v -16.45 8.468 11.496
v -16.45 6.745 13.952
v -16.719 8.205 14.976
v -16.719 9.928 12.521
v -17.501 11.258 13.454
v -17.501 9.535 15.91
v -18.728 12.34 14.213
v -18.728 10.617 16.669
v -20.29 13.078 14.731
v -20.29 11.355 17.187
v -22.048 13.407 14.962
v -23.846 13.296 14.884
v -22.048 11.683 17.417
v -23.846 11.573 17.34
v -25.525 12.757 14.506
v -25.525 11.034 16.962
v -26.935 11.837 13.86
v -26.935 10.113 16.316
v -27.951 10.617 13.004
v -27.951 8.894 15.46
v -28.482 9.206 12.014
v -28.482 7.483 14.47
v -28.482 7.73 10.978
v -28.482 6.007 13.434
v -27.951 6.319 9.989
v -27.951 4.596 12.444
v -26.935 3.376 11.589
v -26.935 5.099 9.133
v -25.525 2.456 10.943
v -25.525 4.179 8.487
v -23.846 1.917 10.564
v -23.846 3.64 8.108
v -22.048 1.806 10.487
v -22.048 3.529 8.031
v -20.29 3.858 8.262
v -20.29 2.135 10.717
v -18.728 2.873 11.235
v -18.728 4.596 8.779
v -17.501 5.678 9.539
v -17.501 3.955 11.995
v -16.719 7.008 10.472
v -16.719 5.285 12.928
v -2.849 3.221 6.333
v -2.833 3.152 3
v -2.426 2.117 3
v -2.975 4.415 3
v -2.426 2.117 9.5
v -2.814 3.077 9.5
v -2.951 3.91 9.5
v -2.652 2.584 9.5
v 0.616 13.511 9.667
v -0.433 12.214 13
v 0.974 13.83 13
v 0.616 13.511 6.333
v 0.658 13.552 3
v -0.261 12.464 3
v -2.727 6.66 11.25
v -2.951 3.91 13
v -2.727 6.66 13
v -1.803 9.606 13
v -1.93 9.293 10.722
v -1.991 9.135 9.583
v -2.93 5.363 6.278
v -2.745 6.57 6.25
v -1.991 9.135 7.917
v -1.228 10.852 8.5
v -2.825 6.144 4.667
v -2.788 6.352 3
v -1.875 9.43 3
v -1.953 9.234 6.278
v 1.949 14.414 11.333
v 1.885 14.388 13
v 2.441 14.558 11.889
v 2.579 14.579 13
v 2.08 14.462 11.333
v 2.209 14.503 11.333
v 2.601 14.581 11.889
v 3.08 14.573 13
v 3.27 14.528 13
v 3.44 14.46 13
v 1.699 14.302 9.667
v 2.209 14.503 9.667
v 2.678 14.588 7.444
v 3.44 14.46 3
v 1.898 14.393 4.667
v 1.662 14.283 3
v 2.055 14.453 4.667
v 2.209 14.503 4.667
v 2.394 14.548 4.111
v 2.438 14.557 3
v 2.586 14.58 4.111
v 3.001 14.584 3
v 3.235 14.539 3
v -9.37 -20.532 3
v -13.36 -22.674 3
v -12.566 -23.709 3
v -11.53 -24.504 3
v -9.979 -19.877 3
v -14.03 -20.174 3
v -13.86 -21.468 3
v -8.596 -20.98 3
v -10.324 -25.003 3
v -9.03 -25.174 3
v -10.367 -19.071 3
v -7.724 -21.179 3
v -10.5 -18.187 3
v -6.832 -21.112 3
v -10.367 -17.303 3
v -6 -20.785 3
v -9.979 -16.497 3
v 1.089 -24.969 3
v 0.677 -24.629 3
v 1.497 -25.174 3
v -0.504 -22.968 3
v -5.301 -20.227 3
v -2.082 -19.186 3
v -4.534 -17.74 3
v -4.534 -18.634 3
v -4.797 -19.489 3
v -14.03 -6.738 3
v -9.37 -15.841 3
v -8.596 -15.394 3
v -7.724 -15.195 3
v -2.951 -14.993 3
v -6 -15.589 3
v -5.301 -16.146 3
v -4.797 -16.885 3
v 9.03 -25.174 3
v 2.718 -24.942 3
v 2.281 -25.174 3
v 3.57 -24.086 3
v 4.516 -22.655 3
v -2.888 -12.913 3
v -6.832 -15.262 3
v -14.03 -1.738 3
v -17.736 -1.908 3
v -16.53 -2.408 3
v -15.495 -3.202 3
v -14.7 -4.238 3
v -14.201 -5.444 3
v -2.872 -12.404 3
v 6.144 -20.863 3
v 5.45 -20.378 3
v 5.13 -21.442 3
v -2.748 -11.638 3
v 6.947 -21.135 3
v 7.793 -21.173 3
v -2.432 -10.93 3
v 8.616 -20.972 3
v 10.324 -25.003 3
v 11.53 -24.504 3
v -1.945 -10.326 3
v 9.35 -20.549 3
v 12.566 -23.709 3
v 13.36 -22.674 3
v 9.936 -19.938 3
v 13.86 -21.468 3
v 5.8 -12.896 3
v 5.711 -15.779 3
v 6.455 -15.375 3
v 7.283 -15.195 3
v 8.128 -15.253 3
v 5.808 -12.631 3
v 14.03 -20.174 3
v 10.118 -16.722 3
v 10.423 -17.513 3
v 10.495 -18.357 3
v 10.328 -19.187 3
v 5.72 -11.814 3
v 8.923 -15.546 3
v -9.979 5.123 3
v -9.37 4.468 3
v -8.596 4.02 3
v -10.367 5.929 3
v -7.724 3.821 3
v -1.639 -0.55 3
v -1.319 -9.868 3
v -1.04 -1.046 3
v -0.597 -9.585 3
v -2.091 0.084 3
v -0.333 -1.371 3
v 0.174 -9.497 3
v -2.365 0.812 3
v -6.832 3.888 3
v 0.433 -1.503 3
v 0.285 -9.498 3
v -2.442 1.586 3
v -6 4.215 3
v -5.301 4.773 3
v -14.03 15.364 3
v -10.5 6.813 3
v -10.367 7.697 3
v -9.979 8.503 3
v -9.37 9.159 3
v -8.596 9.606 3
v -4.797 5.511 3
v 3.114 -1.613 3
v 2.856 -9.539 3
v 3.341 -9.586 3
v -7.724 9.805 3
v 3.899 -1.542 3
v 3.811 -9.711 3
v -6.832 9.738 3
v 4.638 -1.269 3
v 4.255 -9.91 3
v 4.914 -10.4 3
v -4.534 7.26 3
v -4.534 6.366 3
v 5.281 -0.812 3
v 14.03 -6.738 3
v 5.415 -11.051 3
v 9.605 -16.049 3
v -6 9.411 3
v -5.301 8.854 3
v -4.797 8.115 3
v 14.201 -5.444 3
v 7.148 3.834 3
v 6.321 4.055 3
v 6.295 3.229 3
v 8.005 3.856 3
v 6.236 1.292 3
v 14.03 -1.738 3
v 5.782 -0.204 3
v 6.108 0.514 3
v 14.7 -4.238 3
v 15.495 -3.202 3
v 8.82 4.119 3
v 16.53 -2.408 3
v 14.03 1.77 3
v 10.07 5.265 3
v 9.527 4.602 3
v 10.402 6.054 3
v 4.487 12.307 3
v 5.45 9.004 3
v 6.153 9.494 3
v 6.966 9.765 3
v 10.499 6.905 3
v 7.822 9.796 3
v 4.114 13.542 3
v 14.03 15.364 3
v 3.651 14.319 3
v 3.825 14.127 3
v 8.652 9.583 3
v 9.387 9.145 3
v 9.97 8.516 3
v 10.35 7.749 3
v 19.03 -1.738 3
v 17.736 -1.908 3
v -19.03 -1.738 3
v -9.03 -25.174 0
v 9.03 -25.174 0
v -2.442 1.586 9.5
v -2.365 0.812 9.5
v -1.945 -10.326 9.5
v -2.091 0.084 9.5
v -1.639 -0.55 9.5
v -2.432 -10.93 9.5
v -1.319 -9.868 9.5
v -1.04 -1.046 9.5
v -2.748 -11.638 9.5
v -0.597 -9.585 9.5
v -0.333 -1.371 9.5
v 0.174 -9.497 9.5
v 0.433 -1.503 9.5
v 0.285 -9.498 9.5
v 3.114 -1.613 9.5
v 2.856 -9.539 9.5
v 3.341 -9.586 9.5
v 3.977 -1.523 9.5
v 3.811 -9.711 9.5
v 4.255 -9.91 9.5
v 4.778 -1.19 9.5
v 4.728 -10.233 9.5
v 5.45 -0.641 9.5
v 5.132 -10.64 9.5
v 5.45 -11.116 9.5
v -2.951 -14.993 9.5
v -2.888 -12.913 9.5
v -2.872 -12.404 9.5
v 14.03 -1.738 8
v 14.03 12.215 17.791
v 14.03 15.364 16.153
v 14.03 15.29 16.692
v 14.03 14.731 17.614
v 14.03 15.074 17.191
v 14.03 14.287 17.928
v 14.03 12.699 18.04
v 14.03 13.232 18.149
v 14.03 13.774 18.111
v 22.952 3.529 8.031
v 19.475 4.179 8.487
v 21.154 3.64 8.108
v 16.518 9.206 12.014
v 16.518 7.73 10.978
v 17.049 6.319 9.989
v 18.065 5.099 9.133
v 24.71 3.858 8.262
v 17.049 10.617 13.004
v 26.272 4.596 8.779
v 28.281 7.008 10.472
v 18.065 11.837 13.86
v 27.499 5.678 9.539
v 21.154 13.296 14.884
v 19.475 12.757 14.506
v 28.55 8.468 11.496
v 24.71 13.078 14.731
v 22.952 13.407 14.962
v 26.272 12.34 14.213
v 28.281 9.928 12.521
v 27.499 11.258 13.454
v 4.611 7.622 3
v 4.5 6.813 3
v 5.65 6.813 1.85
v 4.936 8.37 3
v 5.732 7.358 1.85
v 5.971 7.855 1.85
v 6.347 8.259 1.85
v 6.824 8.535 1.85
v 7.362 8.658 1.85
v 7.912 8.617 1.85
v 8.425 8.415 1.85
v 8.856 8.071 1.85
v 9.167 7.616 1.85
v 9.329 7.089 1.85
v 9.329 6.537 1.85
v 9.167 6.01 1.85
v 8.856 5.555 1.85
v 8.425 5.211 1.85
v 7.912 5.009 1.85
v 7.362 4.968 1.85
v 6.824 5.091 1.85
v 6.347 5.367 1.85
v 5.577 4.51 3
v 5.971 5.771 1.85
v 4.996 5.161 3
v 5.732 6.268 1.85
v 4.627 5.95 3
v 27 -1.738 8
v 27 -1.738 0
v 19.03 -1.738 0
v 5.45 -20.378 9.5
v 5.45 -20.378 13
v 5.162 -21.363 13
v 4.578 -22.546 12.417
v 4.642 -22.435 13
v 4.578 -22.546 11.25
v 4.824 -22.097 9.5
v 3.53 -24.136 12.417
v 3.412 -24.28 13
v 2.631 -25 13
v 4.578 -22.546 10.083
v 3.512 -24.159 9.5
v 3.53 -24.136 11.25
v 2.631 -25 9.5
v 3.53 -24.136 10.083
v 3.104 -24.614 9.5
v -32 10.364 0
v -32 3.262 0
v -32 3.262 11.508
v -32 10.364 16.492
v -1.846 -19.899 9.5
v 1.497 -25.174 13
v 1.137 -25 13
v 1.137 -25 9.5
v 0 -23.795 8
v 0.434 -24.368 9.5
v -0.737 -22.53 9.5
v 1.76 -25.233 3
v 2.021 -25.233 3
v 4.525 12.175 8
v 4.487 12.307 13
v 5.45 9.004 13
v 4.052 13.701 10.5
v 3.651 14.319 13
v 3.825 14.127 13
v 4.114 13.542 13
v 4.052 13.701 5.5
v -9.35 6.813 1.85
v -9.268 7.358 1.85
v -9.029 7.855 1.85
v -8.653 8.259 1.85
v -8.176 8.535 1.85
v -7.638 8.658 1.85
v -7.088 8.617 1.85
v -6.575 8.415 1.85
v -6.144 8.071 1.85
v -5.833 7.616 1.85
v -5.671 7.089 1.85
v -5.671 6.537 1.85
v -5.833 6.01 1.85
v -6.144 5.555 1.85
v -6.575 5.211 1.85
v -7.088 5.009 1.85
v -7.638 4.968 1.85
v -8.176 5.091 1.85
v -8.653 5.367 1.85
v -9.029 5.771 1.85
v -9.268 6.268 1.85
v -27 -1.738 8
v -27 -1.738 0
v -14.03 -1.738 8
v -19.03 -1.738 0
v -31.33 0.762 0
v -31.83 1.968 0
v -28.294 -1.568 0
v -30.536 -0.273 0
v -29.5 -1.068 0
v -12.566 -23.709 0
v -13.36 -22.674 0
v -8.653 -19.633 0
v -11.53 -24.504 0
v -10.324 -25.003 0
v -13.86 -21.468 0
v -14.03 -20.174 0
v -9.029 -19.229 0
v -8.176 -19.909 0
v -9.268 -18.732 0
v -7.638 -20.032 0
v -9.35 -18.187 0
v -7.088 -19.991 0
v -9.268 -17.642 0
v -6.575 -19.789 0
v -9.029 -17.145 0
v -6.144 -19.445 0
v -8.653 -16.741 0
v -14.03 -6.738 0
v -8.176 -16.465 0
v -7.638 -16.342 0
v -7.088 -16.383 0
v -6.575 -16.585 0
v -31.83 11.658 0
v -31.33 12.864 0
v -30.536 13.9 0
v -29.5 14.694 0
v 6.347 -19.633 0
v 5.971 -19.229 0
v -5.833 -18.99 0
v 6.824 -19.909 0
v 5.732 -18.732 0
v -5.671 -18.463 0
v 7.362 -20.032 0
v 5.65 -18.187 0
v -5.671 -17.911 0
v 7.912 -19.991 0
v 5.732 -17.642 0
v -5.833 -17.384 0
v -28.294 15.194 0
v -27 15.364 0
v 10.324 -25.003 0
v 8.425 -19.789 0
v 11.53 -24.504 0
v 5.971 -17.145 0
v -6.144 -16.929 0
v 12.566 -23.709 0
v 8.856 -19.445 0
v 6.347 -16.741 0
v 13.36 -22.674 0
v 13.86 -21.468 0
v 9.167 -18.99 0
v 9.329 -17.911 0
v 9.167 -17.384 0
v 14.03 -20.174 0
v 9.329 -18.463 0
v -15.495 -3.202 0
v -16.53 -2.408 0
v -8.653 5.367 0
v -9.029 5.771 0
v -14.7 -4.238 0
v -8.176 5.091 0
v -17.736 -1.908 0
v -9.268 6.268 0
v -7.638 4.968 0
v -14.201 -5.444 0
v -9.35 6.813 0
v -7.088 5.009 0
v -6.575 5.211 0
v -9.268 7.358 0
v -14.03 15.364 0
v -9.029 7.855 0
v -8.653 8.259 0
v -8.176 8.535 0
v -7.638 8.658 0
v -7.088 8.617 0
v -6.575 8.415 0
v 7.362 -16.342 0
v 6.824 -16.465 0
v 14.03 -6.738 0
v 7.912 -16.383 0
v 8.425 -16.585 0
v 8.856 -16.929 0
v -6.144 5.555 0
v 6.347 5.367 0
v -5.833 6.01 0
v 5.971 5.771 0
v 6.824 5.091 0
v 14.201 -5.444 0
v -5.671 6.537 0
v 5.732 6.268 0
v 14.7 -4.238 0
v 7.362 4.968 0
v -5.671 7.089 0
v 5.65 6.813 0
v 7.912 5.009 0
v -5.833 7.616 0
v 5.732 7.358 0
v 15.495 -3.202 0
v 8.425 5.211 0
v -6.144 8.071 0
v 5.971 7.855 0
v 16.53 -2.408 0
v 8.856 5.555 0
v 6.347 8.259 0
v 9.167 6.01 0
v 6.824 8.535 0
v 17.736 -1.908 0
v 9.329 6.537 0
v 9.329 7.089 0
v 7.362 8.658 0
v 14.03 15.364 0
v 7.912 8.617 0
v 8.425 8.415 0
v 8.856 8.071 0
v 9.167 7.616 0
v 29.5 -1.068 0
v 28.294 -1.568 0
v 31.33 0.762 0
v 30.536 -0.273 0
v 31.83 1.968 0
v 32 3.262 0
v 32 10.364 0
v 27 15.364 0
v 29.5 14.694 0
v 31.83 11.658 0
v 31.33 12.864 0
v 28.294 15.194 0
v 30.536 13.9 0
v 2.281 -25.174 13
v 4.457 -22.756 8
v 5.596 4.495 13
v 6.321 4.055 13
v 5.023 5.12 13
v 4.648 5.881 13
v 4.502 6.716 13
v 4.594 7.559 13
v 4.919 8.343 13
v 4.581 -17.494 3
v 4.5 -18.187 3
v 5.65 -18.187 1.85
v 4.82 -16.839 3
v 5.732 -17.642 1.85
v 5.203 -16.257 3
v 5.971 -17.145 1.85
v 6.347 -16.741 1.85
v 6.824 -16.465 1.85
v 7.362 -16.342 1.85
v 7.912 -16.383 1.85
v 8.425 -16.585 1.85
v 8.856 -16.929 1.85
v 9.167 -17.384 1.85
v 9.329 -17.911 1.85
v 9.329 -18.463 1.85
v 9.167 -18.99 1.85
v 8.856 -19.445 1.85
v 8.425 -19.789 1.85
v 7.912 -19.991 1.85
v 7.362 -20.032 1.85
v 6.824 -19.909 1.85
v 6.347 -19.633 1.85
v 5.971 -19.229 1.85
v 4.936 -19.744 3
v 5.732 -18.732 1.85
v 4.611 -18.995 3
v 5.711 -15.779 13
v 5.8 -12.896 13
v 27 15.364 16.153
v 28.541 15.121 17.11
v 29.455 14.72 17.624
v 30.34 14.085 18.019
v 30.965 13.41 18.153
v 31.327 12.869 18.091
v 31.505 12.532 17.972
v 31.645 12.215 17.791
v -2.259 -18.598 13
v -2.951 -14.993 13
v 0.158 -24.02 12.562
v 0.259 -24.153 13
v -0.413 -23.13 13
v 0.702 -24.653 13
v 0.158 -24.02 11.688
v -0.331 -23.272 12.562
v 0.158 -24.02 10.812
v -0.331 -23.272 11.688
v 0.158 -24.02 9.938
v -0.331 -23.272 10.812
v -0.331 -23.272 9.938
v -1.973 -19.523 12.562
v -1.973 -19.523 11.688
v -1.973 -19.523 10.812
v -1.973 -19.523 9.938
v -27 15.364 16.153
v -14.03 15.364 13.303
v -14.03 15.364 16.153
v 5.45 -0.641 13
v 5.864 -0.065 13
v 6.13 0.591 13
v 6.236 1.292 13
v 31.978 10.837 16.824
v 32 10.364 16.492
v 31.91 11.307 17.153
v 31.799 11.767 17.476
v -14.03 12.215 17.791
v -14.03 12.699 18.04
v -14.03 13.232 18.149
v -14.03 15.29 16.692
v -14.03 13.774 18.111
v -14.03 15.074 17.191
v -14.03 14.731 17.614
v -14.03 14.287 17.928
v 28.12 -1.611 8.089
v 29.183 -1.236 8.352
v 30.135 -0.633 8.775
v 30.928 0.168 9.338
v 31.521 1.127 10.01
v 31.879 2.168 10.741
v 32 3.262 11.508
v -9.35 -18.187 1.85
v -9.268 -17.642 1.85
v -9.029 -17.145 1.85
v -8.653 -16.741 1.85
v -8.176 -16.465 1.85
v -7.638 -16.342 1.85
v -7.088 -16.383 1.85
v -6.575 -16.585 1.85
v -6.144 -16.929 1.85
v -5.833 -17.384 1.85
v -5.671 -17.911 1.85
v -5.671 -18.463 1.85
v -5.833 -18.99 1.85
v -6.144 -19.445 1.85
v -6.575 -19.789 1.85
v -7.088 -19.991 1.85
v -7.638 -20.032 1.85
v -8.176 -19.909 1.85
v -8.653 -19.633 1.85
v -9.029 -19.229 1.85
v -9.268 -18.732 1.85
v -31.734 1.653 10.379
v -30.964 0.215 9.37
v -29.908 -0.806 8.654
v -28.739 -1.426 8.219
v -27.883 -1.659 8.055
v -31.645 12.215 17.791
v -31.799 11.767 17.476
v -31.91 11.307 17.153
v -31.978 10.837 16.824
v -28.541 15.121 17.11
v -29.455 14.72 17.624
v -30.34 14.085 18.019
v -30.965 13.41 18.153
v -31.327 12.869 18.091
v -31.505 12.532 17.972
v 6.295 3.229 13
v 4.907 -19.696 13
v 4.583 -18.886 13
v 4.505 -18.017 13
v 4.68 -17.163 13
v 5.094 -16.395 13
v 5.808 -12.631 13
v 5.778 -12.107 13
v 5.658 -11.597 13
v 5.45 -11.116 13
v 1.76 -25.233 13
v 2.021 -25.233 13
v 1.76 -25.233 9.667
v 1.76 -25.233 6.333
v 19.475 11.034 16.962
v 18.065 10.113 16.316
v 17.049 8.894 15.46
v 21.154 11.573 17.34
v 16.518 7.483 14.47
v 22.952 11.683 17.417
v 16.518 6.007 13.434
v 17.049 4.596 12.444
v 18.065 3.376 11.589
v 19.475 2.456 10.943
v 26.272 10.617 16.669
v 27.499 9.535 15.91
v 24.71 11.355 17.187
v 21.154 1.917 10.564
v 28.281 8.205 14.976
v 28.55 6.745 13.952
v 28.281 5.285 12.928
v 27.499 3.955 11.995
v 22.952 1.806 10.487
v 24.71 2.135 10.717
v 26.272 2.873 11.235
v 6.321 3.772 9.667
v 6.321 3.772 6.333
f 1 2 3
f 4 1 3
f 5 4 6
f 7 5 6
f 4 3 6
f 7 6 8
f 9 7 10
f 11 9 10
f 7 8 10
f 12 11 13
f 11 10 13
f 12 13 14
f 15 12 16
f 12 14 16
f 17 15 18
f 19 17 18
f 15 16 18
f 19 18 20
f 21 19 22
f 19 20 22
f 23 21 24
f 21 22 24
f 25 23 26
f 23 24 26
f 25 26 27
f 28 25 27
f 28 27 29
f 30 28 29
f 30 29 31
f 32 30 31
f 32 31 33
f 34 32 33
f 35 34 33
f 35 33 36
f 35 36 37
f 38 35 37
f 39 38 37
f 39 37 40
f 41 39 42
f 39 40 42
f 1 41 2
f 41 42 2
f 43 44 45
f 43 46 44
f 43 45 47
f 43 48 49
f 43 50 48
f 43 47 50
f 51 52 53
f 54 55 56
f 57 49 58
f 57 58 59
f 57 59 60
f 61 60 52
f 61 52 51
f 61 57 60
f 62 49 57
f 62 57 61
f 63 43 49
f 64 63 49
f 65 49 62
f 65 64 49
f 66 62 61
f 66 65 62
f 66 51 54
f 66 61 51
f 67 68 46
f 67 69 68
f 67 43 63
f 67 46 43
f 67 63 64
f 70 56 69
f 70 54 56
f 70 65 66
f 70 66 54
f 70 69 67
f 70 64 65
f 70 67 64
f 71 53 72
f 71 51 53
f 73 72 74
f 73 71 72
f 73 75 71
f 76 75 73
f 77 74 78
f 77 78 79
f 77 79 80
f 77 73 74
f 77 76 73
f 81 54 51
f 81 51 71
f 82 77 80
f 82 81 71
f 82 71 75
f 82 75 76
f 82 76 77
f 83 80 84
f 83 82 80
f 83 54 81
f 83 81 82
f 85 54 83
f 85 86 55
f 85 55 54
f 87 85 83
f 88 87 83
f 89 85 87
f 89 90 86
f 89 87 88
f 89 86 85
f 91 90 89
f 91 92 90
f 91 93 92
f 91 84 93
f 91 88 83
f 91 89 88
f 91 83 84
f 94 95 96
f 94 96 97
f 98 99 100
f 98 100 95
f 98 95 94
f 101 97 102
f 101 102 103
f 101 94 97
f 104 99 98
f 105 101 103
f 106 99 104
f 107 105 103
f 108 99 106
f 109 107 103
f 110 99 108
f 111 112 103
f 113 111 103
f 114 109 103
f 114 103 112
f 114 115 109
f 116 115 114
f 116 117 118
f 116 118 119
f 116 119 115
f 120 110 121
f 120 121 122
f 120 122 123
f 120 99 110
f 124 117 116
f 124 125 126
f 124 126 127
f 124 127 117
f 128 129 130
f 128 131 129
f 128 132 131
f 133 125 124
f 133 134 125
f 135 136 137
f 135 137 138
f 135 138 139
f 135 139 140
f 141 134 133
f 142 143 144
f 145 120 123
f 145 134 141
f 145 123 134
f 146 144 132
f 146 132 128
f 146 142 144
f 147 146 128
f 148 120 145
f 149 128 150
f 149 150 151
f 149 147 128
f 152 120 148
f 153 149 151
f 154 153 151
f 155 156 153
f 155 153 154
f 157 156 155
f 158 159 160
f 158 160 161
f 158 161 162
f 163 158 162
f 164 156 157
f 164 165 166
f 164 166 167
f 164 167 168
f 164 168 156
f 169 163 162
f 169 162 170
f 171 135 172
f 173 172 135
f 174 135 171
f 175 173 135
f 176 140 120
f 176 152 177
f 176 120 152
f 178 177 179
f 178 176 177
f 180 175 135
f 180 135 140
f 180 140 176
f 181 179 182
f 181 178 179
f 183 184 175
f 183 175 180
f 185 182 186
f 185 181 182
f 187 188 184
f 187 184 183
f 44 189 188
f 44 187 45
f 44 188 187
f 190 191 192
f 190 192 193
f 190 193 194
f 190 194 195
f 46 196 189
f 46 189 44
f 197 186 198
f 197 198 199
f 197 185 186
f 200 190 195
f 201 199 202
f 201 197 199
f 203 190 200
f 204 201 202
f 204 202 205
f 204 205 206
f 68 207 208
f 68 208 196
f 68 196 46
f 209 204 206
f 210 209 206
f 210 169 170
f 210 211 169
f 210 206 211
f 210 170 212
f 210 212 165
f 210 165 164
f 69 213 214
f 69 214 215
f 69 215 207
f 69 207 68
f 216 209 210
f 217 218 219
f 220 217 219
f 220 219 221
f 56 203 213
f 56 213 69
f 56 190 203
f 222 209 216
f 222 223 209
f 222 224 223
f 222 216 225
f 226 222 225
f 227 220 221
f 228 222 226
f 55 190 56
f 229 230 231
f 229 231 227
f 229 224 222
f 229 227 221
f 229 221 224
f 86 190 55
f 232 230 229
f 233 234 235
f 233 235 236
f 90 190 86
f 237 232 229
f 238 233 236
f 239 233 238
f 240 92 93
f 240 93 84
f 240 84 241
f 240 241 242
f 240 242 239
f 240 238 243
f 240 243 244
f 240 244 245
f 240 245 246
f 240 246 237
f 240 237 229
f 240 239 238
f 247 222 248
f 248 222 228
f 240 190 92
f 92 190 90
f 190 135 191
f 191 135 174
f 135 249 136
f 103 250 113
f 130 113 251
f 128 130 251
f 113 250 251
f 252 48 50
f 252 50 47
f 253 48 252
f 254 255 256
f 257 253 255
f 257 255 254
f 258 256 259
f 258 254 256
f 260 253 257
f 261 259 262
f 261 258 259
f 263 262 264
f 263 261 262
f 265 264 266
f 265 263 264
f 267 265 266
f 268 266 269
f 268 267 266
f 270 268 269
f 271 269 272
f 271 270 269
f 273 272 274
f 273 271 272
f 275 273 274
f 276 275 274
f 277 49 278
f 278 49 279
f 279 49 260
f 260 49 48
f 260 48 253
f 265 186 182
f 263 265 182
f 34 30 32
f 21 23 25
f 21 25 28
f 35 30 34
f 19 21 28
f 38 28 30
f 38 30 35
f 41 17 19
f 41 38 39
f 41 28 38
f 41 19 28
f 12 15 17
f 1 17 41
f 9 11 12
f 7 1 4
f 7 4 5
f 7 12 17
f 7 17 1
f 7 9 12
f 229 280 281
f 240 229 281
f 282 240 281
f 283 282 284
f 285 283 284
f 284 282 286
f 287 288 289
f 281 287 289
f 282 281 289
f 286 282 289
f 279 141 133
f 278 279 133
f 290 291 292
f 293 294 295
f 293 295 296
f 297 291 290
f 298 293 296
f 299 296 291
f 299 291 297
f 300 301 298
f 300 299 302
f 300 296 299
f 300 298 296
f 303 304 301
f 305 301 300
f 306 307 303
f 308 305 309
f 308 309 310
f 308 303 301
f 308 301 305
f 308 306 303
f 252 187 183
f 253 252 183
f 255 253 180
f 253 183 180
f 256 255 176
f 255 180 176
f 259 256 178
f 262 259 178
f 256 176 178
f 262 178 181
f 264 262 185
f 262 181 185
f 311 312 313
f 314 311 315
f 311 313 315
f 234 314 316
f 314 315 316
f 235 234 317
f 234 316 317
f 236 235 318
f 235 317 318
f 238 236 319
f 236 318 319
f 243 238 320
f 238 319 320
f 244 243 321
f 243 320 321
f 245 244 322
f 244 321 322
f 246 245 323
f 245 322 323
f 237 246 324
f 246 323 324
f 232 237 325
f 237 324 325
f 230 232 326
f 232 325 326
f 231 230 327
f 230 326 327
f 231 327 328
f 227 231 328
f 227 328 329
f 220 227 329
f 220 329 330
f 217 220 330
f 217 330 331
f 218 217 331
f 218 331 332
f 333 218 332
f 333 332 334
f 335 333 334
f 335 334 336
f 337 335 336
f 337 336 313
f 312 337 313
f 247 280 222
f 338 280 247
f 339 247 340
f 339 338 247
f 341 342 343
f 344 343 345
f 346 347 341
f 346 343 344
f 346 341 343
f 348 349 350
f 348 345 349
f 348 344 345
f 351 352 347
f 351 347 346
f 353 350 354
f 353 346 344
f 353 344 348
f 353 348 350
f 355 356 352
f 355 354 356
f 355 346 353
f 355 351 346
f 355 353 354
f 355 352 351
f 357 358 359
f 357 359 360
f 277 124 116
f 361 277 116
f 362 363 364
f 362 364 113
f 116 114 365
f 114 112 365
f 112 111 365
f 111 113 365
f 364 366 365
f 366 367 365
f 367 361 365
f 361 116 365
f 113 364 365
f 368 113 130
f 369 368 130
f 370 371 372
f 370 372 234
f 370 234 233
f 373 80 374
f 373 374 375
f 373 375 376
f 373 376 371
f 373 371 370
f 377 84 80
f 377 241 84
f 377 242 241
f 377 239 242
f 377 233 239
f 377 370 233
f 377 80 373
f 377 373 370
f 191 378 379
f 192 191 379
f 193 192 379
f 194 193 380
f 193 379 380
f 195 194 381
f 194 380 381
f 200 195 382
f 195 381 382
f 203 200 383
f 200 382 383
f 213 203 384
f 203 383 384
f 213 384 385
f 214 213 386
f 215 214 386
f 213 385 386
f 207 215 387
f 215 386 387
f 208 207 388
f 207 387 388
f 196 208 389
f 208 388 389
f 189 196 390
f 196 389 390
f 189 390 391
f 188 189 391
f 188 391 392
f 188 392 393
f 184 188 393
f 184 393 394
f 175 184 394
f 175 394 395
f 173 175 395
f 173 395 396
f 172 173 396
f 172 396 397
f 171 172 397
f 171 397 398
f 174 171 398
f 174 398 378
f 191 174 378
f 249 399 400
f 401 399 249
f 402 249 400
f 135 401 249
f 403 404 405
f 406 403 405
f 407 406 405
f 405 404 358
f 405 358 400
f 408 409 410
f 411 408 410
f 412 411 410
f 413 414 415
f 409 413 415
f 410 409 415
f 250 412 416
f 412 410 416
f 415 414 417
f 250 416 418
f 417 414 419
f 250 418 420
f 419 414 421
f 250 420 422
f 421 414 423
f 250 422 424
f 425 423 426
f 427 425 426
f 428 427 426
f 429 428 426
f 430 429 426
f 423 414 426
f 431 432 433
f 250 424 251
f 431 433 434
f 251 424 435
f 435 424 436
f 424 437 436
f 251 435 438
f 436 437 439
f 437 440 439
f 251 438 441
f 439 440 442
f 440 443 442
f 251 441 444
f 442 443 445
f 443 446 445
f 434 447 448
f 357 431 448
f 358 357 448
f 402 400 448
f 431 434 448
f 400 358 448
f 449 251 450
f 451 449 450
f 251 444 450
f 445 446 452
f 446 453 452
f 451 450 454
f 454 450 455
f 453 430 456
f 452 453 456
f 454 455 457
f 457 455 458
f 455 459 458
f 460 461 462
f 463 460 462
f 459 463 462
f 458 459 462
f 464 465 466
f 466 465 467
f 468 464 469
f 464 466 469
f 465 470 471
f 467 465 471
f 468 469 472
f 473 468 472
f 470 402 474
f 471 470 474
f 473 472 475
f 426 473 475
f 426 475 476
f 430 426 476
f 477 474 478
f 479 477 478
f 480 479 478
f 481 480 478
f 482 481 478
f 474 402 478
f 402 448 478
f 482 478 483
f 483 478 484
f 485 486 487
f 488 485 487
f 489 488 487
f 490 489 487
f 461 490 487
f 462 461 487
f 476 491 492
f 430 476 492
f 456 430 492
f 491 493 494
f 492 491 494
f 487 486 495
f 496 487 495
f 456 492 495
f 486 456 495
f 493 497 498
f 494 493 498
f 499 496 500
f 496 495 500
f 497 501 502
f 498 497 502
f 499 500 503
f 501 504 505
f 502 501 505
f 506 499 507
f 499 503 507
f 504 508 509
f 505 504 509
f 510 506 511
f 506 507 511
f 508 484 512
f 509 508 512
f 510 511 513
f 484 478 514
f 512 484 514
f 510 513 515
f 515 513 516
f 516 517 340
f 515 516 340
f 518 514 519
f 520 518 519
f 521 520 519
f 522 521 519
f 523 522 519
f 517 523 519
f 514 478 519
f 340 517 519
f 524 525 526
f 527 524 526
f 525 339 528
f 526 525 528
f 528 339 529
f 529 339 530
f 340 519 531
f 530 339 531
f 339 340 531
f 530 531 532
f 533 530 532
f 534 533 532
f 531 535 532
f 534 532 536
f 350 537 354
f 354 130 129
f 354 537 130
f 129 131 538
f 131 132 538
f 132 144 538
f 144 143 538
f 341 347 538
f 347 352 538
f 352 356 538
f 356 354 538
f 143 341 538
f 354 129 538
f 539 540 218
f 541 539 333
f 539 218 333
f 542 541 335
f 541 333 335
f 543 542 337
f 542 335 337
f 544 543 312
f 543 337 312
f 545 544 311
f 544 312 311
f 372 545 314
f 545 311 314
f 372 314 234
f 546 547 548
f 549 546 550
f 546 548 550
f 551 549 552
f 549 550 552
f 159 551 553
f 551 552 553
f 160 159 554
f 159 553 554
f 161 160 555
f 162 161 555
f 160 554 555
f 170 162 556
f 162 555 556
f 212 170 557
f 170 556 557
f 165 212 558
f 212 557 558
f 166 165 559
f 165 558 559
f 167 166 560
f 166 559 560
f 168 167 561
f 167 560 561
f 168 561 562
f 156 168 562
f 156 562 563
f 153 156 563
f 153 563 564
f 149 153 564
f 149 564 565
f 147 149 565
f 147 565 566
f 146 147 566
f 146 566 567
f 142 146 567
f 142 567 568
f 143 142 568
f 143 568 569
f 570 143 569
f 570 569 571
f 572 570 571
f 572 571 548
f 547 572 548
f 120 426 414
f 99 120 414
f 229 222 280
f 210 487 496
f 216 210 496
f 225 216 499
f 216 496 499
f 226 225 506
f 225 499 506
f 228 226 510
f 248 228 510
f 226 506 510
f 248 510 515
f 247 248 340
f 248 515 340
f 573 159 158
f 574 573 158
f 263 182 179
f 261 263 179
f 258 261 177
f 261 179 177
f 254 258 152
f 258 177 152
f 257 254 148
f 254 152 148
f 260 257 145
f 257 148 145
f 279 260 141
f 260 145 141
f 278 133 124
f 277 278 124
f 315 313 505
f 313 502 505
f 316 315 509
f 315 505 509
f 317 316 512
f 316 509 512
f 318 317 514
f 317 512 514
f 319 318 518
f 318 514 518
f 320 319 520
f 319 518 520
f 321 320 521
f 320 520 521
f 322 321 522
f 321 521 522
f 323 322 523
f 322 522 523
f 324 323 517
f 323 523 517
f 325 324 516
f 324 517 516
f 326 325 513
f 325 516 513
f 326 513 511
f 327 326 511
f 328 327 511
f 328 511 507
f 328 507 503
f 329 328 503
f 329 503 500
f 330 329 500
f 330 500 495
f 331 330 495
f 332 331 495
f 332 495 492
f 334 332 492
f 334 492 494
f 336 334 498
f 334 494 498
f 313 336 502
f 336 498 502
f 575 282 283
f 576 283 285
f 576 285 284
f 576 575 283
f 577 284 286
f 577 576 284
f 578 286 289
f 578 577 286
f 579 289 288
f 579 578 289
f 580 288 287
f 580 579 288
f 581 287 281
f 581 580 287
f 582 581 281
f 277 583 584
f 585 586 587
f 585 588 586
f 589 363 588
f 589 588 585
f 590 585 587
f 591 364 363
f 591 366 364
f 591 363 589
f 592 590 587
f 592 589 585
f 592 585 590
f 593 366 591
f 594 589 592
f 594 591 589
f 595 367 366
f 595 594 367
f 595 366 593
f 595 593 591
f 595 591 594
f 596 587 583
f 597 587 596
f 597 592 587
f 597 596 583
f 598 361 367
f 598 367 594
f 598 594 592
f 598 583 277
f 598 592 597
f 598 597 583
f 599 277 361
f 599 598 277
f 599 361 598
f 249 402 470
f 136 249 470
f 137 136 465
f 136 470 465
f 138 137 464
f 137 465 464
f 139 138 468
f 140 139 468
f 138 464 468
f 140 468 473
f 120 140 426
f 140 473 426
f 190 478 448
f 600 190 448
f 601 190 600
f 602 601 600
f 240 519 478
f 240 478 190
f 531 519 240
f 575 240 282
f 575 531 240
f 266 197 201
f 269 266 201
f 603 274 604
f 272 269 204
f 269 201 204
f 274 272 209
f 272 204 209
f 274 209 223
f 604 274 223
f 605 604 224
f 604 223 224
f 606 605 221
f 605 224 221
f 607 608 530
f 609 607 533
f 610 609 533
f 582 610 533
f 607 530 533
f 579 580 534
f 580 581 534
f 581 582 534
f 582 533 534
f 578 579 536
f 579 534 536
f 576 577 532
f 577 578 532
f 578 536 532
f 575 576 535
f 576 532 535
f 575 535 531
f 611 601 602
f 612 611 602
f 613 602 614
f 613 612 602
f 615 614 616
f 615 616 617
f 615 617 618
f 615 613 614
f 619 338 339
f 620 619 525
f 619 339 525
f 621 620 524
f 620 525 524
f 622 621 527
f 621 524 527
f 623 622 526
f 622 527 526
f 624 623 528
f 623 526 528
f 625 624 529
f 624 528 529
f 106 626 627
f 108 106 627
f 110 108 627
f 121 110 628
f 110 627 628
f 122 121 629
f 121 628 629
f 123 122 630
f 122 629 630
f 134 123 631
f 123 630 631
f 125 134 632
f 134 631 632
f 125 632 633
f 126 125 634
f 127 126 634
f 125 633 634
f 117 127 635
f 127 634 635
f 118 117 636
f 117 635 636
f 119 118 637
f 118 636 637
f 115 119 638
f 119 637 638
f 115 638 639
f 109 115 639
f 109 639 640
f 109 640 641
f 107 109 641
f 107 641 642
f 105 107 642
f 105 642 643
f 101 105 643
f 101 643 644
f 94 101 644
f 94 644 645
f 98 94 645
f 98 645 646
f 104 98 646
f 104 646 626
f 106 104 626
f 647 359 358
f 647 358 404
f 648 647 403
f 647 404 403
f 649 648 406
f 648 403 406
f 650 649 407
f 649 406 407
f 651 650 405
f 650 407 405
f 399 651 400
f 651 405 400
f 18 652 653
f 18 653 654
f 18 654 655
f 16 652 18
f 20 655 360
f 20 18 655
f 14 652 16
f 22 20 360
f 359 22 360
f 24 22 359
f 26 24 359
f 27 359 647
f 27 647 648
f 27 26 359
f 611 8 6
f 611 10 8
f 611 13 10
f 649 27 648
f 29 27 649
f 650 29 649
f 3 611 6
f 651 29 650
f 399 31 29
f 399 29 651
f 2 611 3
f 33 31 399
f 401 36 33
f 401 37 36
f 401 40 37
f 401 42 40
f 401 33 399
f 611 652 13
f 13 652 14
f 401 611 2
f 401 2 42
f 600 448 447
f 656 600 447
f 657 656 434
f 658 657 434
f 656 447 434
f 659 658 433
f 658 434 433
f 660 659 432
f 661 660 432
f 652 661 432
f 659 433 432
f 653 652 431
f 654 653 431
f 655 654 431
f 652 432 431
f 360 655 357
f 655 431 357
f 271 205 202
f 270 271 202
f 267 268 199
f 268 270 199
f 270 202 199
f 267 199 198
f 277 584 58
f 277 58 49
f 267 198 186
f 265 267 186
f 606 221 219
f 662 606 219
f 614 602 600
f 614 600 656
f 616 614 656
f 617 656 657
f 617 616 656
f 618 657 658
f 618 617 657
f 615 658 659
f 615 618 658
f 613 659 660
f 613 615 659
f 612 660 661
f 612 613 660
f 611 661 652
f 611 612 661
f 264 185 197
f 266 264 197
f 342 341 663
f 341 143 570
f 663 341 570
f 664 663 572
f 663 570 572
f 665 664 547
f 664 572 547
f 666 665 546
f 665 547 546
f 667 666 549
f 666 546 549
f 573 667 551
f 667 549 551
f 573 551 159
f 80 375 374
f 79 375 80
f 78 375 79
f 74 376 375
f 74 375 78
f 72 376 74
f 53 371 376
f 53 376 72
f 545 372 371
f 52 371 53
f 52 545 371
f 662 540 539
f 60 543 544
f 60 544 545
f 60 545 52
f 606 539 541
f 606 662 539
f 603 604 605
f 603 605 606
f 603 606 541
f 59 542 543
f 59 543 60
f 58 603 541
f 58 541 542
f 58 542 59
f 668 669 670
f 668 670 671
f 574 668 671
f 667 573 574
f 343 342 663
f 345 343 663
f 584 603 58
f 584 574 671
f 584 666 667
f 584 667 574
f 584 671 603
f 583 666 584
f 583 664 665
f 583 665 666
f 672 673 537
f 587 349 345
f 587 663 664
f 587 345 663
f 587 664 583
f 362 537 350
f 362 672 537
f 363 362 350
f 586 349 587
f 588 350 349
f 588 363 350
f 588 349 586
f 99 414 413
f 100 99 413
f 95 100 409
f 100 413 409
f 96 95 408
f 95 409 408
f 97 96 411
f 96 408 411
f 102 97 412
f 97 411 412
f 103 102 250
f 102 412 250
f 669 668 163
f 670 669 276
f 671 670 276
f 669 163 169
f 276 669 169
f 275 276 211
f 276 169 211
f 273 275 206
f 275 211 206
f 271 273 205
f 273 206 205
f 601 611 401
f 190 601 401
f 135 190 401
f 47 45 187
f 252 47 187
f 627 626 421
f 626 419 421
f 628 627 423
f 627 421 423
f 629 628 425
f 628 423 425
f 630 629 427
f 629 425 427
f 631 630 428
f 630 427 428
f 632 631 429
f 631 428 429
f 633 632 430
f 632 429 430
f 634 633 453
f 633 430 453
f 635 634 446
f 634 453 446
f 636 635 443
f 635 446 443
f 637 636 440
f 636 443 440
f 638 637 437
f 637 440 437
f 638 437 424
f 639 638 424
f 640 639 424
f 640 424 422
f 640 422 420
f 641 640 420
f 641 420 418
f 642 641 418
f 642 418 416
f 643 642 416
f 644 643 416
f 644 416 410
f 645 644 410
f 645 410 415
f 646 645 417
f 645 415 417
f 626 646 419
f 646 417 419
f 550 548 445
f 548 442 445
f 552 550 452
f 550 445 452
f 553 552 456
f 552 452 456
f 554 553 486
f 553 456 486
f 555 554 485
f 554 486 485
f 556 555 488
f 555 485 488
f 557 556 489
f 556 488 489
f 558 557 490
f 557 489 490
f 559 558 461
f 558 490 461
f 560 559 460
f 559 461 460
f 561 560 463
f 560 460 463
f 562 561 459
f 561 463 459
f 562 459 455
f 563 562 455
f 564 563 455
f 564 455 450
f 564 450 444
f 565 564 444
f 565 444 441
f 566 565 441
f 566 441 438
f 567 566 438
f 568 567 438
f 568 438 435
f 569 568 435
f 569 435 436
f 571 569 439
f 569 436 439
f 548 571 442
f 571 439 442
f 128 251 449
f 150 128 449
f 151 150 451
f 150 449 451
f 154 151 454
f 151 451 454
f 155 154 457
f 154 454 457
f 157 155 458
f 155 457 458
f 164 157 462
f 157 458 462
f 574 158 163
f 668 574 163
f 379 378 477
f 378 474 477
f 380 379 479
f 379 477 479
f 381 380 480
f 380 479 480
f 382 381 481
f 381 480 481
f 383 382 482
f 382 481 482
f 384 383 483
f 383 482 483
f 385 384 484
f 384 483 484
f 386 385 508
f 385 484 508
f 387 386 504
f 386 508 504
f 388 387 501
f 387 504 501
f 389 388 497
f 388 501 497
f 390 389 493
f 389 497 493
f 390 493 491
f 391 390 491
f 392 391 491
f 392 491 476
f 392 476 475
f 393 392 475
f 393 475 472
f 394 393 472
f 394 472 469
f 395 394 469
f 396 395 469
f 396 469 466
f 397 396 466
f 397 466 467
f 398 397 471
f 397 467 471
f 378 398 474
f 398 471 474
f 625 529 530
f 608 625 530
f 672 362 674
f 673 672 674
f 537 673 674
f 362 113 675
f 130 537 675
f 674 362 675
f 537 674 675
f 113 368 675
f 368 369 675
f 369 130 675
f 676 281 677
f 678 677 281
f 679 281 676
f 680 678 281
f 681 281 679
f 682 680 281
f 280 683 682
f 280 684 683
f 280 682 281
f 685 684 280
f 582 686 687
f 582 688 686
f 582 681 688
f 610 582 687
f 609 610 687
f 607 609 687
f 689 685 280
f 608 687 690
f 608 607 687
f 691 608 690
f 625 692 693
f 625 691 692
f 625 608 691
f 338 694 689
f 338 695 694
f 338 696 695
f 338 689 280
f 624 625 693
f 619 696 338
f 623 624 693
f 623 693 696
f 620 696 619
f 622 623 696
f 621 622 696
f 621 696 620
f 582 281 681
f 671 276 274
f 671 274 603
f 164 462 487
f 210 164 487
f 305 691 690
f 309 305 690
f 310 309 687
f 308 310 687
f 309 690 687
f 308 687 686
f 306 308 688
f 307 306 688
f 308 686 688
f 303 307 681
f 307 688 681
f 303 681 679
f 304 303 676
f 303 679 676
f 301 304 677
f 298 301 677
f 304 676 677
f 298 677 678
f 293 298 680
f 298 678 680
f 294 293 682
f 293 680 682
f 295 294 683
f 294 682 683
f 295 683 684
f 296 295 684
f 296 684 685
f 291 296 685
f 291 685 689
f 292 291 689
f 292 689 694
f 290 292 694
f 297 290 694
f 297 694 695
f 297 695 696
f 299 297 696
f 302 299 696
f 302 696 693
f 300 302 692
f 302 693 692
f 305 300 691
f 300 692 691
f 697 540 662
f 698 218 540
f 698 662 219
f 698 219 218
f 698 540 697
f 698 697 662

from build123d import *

# Parameters (mm, degrees)
F0_W            = 28.0605573207
F0_H            = 17.1019586477
F1_DEPTH        = 3
F3_DEPTH        = 32
F3_DEPTH_BACK   = 32
F4_DEPTH        = 25
F5_W            = 28.0605573207
F5_H            = 17.0454510609
F5_H_2          = 8.3564384666
F6_REACH        = 49.2047839512
F5_R            = 6.05
F7_DEPTH        = 3
F9_DEPTH        = 10
F10_D           = 3.7
F10_CSINK_D     = 6
F10_CSINK_ANGLE = 90
F12_DEPTH       = 25
F13_DEPTH       = 25
F14_DEPTH       = 5


# Not quite as in the source:
# - a feature names something its author has since deleted; it is built from what else it names


with BuildPart() as f1:
    # F0 (on Top) → F1 (new body)
    with BuildSketch(Plane.XY):
        with BuildLine():
            Line((-19.0302786604, -1.7378998397), (-14.0302786604, -1.7378998397))
            Line((-14.0302786604, -1.7378998397), (-14.0302786604, 15.3640588081))
            Line((-14.0302786604, 15.3640588081), (-27, 15.3640588081))
            ThreePointArc((-27, 15.3640588081), (-30.5355339059, 13.899592714), (-32, 10.3640588081))
            Line((-32, 10.3640588081), (-32, 3.2621001603))
            ThreePointArc((-32, 3.2621001603), (-30.5355339059, -0.2734337456), (-27, -1.7378998397))
            Line((-27, -1.7378998397), (-20.8602603525, -1.7378998397))
            Line((-20.8602603525, -1.7378998397), (-19.0302786604, -1.7378998397))
        make_face()
        with BuildLine():
            ThreePointArc((-14.0302786604, -20.1735929717), (-12.5658125663, -23.7091268776), (-9.0302786604, -25.1735929717))
            Line((-9.0302786604, -25.1735929717), (9.0302786604, -25.1735929717))
            ThreePointArc((9.0302786604, -25.1735929717), (12.5658125663, -23.7091268776), (14.0302786604, -20.1735929717))
            Line((14.0302786604, -20.1735929717), (14.0302786604, -6.7378998397))
            Line((14.0302786604, -6.7378998397), (14.0302786604, -1.7378998397))
            Line((14.0302786604, -1.7378998397), (-14.0302786604, -1.7378998397))
            Line((-14.0302786604, -1.7378998397), (-14.0302786604, -6.7378998397))
            Line((-14.0302786604, -6.7378998397), (-14.0302786604, -20.1735929717))
        make_face()
        with BuildLine():
            Line((14.0302786604, 15.3640588081), (14.0302786604, -1.7378998397))
            Line((14.0302786604, -1.7378998397), (19.0302786604, -1.7378998397))
            Line((19.0302786604, -1.7378998397), (21.6872710735, -1.7378998397))
            Line((21.6872710735, -1.7378998397), (27, -1.7378998397))
            ThreePointArc((27, -1.7378998397), (30.5355339059, -0.2734337456), (32, 3.2621001603))
            Line((32, 3.2621001603), (32, 10.3640588081))
            ThreePointArc((32, 10.3640588081), (30.5355339059, 13.899592714), (27, 15.3640588081))
            Line((27, 15.3640588081), (14.0302786604, 15.3640588081))
        make_face()
        with Locations((0, 6.8130794842)):
            Rectangle(F0_W, F0_H)
        with BuildLine():
            ThreePointArc((-19.0302786604, -1.7378998397), (-15.4947447544, -3.2023659338), (-14.0302786604, -6.7378998397))
            Line((-14.0302786604, -6.7378998397), (-14.0302786604, -1.7378998397))
            Line((-14.0302786604, -1.7378998397), (-19.0302786604, -1.7378998397))
        make_face()
        with BuildLine():
            Line((14.0302786604, -1.7378998397), (14.0302786604, -6.7378998397))
            ThreePointArc((14.0302786604, -6.7378998397), (15.4947447544, -3.2023659338), (19.0302786604, -1.7378998397))
            Line((19.0302786604, -1.7378998397), (14.0302786604, -1.7378998397))
        make_face()
    extrude(amount=F1_DEPTH)

    # F2 (on Right) → F3 (join, two sides)
    with BuildSketch(Plane.YZ) as f3_sk:
        with BuildLine():
            Line((-1.7378998397, 8), (-1.7378998397, 3))
            Line((-1.7378998397, 3), (15.3640588081, 3))
            Line((15.3640588081, 3), (15.3640588081, 16.1534193361))
            ThreePointArc((15.3640588081, 16.1534193361), (14.2866836868, 17.9278948454), (12.2152954749, 17.7905945877))
            Line((12.2152954749, 17.7905945877), (-1.7378998397, 8))
        make_face()
    extrude(amount=F3_DEPTH)
    extrude(f3_sk.sketch, amount=-F3_DEPTH_BACK)

    # F4 (cut): faces of the model
    f4_faces = [f1.faces().sort_by_distance(p)[0] for p in [
        (-30.8831603053, 14.2472191133, 3),
        (-30.8831603053, -0.621060145, 3),
        (30.8831603053, -0.621060145, 3),
        (30.8831603053, 14.2472191133, 3),
    ]]
    extrude(f4_faces, amount=-F4_DEPTH, mode=Mode.SUBTRACT)

    f6_end = Plane(origin=(0, -13.1098018859, 3), x_dir=(1, 0, 0), z_dir=(0, 0, 1))
    # F5 (on face) → F6 (cut, up to a plane its end follows)
    with BuildSketch(Plane(origin=(0, -4.334811805, 6.177814353), x_dir=(1, 0, 0), z_dir=(0, -0.5743816666, 0.8185876258))):
        with Locations((0, 11.6951555593)):
            Rectangle(F5_W, F5_H)
        Polygon((14.0302786604, -5.0207045861), (14.0302786604, 0), (14.0302786604, 3.1724300289), (-14.0302786604, 3.1724300289), (-14.0302786604, 0), (-14.0302786604, -5.0207045861), align=None)
        with Locations((0, 24.396100323)):
            Rectangle(F5_W, F5_H_2)
    f6_long = extrude(amount=-F6_REACH, mode=Mode.PRIVATE)
    add(split(f6_long, bisect_by=f6_end, keep=Keep.TOP, mode=Mode.PRIVATE), mode=Mode.SUBTRACT)

    # F5 (on face) → F7 (cut)
    with BuildSketch(Plane(origin=(0, -4.334811805, 6.177814353), x_dir=(1, 0, 0), z_dir=(0, -0.5743816666, 0.8185876258))):
        with Locations((22.5, 13.5350767523)):
            Circle(F5_R)
        with Locations((-22.5, 13.5350767523)):
            Circle(F5_R)
    extrude(amount=-F7_DEPTH, mode=Mode.SUBTRACT)

    # F8 (on face) → F9 (join)
    with BuildSketch(Plane.XY.offset(3)):
        with BuildLine():
            add(Edge.make_bspline(
                [(3.439653721, 14.4599989291), (4.0052184257, 14.1775319538), (4.2384614527, 13.0214622017), (5.1246291924, 10.2048677906), (5.4504108833, 9.003783584)],
                knots=[0, 0, 0, 0, 0.1106519752, 0.1831613583, 0.1831613583, 0.1831613583, 0.1831613583], degree=3))
            add(Edge.make_bspline(
                [(-2.425625543, 2.1165073176), (-2.6128697036, 2.4416064205), (-3.7900282508, 5.4402549428), (-0.4138105091, 14.2334908767), (2.8259898176, 14.7664886821), (3.439653721, 14.4599989291)],
                knots=[0.6187512381, 0.6187512381, 0.6187512381, 0.6187512381, 0.6507091383, 0.8799374811, 1, 1, 1, 1], degree=3))
            add(Edge.make_bspline(
                [(6.2951599905, 3.2293955823), (6.2536285053, 2.7551424943), (5.7362561971, 0.3058795284), (1.5238317893, -0.5897867433), (-1.6783380052, 0.8190435823), (-2.425625543, 2.1165073176)],
                knots=[0.3006282955, 0.3006282955, 0.3006282955, 0.3006282955, 0.3342495888, 0.491207925, 0.6187512381, 0.6187512381, 0.6187512381, 0.6187512381], degree=3))
            Line((6.2951599905, 3.2293955823), (6.3205224566, 4.054668216))
            ThreePointArc((6.3205224566, 4.054668216), (4.5453166658, 6.2936120697), (5.4504108833, 9.003783584))
        make_face()
        with BuildLine():
            add(Edge.make_bspline(
                [(6.2951599905, 3.2293955823), (6.2536285053, 2.7551424943), (5.7362561971, 0.3058795284), (1.5238317893, -0.5897867433), (-1.6783380052, 0.8190435823), (-2.425625543, 2.1165073176)],
                knots=[0.3006282955, 0.3006282955, 0.3006282955, 0.3006282955, 0.3342495888, 0.491207925, 0.6187512381, 0.6187512381, 0.6187512381, 0.6187512381], degree=3))
            Line((-2.425625543, 2.1165073176), (-2.4419164115, 1.5864165937))
            ThreePointArc((-2.4419164115, 1.5864165937), (-1.6394334925, -0.5495415445), (0.4334442969, -1.5032048363))
            Line((0.4334442969, -1.5032048363), (3.1138092408, -1.6133925553))
            ThreePointArc((3.1138092408, -1.6133925553), (5.2808377949, -0.8120256781), (6.2356171285, 1.2919225271))
            Line((6.2356171285, 1.2919225271), (6.2951599905, 3.2293955823))
        make_face()
        with BuildLine():
            add(Edge.make_bspline(
                [(6.3205224566, 4.054668216), (6.3259320308, 3.7685769845), (6.3182004896, 3.4924978464), (6.2951599905, 3.2293955823)],
                knots=[0.2819761483, 0.2819761483, 0.2819761483, 0.2819761483, 0.3006282955, 0.3006282955, 0.3006282955, 0.3006282955], degree=3))
            Line((6.3205224566, 4.054668216), (6.2951599905, 3.2293955823))
        make_face()
        with BuildLine():
            Line((5.7109985458, -15.7787108495), (5.7995937264, -12.895900563))
            add(Edge.make_bspline(
                [(5.7995937264, -12.895900563), (5.6014543432, -11.957203972), (5.2341196587, -10.747475142), (4.4402012509, -10.0397747357), (4.2548362634, -9.909795659)],
                knots=[0.078280994, 0.078280994, 0.078280994, 0.078280994, 0.1532878364, 0.173703161, 0.173703161, 0.173703161, 0.173703161], degree=3))
            ThreePointArc((4.2548362634, -9.909795659), (3.5782527554, -9.6387470487), (2.8562729835, -9.5388581041))
            Line((2.8562729835, -9.5388581041), (0.2851764489, -9.4984770116))
            add(Edge.make_bspline(
                [(0.2851764489, -9.4984770116), (0.1886962517, -9.5257281074), (-1.4223255568, -10.024145371), (-2.5699293228, -11.1174611467), (-2.8875198131, -12.9131313678)],
                knots=[0.2910251466, 0.2910251466, 0.2910251466, 0.2910251466, 0.2995550952, 0.4354391583, 0.4354391583, 0.4354391583, 0.4354391583], degree=3))
            Line((-2.8875198131, -12.9131313678), (-2.9514315077, -14.9927624413))
            add(Edge.make_bspline(
                [(-2.9514315077, -14.9927624413), (-2.7153775465, -18.0022293403), (-0.7781826645, -23.3457780002), (1.0082290092, -25.0100423947), (1.4971567675, -25.1735929717)],
                knots=[0.4816763185, 0.4816763185, 0.4816763185, 0.4816763185, 0.6642562574, 0.7348765677, 0.7348765677, 0.7348765677, 0.7348765677], degree=3))
            Line((1.4971567675, -25.1735929717), (2.2805444633, -25.1735929717))
            add(Edge.make_bspline(
                [(2.2805444633, -25.1735929717), (3.0961818535, -24.8930551973), (4.5940584593, -22.6765141), (5.2897590721, -21.2040650633), (5.4504108833, -20.3776246156)],
                knots=[0.7729673791, 0.7729673791, 0.7729673791, 0.7729673791, 0.8930756087, 1, 1, 1, 1], degree=3))
            ThreePointArc((5.4504108833, -20.3776246156), (4.5048044555, -18.0172041338), (5.7109985458, -15.7787108495))
        make_face()
        with BuildLine():
            add(Edge.make_bspline(
                [(5.7995937264, -12.895900563), (5.6014543432, -11.957203972), (5.2341196587, -10.747475142), (4.4402012509, -10.0397747357), (4.2548362634, -9.909795659)],
                knots=[0.078280994, 0.078280994, 0.078280994, 0.078280994, 0.1532878364, 0.173703161, 0.173703161, 0.173703161, 0.173703161], degree=3))
            Line((5.7995937264, -12.895900563), (5.8077457332, -12.6306413387))
            ThreePointArc((5.8077457332, -12.6306413387), (5.414657568, -11.0514138893), (4.2548362634, -9.909795659))
        make_face()
        with BuildLine():
            add(Edge.make_bspline(
                [(0.2851764489, -9.4984770116), (0.1886962517, -9.5257281074), (-1.4223255568, -10.024145371), (-2.5699293228, -11.1174611467), (-2.8875198131, -12.9131313678)],
                knots=[0.2910251466, 0.2910251466, 0.2910251466, 0.2910251466, 0.2995550952, 0.4354391583, 0.4354391583, 0.4354391583, 0.4354391583], degree=3))
            Line((0.2851764489, -9.4984770116), (0.173816477, -9.4967280157))
            ThreePointArc((0.173816477, -9.4967280157), (-1.9448049821, -10.32637036), (-2.8718793694, -12.4042049027))
            Line((-2.8718793694, -12.4042049027), (-2.8875198131, -12.9131313678))
        make_face()
        with BuildLine():
            add(Edge.make_bspline(
                [(1.4971567675, -25.1735929717), (1.7608720486, -25.2618080212), (2.0218753444, -25.2625619913), (2.2805444633, -25.1735929717)],
                knots=[0.7348765677, 0.7348765677, 0.7348765677, 0.7348765677, 0.7729673791, 0.7729673791, 0.7729673791, 0.7729673791], degree=3))
            Line((2.2805444633, -25.1735929717), (1.4971567675, -25.1735929717))
        make_face()
    extrude(amount=F9_DEPTH)

    # F10 (through all)
    with Locations(Plane.XY.offset(3)):
        with Locations((-7.5, 6.8130794842), (-7.5, -18.1869205158), (7.5, 6.8130794842), (7.5, -18.1869205158)):
            CounterSinkHole(F10_D / 2, F10_CSINK_D / 2, counter_sink_angle=F10_CSINK_ANGLE)

    # F11 (on Front) → F12 (join)
    with BuildSketch(Plane.XZ):
        with BuildLine():
            Line((-2.9514315077, 9.5), (5.4504108833, 9.5))
            Line((5.4504108833, 9.5), (5.4504108833, 13))
            add(Edge.make_bspline(
                [(5.4504108833, 13), (2.649796753, 13), (-0.1508173774, 13), (-2.9514315077, 13)],
                knots=[0.0010524799, 0.0010524799, 0.0010524799, 0.0010524799, 0.9996431059, 0.9996431059, 0.9996431059, 0.9996431059], degree=3))
            Line((-2.9514315077, 13), (-2.9514315077, 9.5))
        make_face()
    extrude(amount=F12_DEPTH)

    # F13 (cut): faces of the model
    f13_faces = [f1.faces().sort_by_distance(p)[0] for p in [
        (-1.8145257216, -22.2530122303, 9.5),
        (4.6195780711, -23.6613899314, 9.5),
        (5.0645605364, -18.1869205158, 9.5),
        (4.6195780711, -23.6613899314, 9.5),
    ]]
    extrude(f13_faces, amount=-F13_DEPTH, mode=Mode.SUBTRACT)

    # F14 (add): a face of the model
    f14_faces = [f1.faces().sort_by_distance(p)[0] for p in [
        (-2.4980717075, 0, 11.25),
    ]]
    extrude(f14_faces, amount=F14_DEPTH)


solid = f1.part
